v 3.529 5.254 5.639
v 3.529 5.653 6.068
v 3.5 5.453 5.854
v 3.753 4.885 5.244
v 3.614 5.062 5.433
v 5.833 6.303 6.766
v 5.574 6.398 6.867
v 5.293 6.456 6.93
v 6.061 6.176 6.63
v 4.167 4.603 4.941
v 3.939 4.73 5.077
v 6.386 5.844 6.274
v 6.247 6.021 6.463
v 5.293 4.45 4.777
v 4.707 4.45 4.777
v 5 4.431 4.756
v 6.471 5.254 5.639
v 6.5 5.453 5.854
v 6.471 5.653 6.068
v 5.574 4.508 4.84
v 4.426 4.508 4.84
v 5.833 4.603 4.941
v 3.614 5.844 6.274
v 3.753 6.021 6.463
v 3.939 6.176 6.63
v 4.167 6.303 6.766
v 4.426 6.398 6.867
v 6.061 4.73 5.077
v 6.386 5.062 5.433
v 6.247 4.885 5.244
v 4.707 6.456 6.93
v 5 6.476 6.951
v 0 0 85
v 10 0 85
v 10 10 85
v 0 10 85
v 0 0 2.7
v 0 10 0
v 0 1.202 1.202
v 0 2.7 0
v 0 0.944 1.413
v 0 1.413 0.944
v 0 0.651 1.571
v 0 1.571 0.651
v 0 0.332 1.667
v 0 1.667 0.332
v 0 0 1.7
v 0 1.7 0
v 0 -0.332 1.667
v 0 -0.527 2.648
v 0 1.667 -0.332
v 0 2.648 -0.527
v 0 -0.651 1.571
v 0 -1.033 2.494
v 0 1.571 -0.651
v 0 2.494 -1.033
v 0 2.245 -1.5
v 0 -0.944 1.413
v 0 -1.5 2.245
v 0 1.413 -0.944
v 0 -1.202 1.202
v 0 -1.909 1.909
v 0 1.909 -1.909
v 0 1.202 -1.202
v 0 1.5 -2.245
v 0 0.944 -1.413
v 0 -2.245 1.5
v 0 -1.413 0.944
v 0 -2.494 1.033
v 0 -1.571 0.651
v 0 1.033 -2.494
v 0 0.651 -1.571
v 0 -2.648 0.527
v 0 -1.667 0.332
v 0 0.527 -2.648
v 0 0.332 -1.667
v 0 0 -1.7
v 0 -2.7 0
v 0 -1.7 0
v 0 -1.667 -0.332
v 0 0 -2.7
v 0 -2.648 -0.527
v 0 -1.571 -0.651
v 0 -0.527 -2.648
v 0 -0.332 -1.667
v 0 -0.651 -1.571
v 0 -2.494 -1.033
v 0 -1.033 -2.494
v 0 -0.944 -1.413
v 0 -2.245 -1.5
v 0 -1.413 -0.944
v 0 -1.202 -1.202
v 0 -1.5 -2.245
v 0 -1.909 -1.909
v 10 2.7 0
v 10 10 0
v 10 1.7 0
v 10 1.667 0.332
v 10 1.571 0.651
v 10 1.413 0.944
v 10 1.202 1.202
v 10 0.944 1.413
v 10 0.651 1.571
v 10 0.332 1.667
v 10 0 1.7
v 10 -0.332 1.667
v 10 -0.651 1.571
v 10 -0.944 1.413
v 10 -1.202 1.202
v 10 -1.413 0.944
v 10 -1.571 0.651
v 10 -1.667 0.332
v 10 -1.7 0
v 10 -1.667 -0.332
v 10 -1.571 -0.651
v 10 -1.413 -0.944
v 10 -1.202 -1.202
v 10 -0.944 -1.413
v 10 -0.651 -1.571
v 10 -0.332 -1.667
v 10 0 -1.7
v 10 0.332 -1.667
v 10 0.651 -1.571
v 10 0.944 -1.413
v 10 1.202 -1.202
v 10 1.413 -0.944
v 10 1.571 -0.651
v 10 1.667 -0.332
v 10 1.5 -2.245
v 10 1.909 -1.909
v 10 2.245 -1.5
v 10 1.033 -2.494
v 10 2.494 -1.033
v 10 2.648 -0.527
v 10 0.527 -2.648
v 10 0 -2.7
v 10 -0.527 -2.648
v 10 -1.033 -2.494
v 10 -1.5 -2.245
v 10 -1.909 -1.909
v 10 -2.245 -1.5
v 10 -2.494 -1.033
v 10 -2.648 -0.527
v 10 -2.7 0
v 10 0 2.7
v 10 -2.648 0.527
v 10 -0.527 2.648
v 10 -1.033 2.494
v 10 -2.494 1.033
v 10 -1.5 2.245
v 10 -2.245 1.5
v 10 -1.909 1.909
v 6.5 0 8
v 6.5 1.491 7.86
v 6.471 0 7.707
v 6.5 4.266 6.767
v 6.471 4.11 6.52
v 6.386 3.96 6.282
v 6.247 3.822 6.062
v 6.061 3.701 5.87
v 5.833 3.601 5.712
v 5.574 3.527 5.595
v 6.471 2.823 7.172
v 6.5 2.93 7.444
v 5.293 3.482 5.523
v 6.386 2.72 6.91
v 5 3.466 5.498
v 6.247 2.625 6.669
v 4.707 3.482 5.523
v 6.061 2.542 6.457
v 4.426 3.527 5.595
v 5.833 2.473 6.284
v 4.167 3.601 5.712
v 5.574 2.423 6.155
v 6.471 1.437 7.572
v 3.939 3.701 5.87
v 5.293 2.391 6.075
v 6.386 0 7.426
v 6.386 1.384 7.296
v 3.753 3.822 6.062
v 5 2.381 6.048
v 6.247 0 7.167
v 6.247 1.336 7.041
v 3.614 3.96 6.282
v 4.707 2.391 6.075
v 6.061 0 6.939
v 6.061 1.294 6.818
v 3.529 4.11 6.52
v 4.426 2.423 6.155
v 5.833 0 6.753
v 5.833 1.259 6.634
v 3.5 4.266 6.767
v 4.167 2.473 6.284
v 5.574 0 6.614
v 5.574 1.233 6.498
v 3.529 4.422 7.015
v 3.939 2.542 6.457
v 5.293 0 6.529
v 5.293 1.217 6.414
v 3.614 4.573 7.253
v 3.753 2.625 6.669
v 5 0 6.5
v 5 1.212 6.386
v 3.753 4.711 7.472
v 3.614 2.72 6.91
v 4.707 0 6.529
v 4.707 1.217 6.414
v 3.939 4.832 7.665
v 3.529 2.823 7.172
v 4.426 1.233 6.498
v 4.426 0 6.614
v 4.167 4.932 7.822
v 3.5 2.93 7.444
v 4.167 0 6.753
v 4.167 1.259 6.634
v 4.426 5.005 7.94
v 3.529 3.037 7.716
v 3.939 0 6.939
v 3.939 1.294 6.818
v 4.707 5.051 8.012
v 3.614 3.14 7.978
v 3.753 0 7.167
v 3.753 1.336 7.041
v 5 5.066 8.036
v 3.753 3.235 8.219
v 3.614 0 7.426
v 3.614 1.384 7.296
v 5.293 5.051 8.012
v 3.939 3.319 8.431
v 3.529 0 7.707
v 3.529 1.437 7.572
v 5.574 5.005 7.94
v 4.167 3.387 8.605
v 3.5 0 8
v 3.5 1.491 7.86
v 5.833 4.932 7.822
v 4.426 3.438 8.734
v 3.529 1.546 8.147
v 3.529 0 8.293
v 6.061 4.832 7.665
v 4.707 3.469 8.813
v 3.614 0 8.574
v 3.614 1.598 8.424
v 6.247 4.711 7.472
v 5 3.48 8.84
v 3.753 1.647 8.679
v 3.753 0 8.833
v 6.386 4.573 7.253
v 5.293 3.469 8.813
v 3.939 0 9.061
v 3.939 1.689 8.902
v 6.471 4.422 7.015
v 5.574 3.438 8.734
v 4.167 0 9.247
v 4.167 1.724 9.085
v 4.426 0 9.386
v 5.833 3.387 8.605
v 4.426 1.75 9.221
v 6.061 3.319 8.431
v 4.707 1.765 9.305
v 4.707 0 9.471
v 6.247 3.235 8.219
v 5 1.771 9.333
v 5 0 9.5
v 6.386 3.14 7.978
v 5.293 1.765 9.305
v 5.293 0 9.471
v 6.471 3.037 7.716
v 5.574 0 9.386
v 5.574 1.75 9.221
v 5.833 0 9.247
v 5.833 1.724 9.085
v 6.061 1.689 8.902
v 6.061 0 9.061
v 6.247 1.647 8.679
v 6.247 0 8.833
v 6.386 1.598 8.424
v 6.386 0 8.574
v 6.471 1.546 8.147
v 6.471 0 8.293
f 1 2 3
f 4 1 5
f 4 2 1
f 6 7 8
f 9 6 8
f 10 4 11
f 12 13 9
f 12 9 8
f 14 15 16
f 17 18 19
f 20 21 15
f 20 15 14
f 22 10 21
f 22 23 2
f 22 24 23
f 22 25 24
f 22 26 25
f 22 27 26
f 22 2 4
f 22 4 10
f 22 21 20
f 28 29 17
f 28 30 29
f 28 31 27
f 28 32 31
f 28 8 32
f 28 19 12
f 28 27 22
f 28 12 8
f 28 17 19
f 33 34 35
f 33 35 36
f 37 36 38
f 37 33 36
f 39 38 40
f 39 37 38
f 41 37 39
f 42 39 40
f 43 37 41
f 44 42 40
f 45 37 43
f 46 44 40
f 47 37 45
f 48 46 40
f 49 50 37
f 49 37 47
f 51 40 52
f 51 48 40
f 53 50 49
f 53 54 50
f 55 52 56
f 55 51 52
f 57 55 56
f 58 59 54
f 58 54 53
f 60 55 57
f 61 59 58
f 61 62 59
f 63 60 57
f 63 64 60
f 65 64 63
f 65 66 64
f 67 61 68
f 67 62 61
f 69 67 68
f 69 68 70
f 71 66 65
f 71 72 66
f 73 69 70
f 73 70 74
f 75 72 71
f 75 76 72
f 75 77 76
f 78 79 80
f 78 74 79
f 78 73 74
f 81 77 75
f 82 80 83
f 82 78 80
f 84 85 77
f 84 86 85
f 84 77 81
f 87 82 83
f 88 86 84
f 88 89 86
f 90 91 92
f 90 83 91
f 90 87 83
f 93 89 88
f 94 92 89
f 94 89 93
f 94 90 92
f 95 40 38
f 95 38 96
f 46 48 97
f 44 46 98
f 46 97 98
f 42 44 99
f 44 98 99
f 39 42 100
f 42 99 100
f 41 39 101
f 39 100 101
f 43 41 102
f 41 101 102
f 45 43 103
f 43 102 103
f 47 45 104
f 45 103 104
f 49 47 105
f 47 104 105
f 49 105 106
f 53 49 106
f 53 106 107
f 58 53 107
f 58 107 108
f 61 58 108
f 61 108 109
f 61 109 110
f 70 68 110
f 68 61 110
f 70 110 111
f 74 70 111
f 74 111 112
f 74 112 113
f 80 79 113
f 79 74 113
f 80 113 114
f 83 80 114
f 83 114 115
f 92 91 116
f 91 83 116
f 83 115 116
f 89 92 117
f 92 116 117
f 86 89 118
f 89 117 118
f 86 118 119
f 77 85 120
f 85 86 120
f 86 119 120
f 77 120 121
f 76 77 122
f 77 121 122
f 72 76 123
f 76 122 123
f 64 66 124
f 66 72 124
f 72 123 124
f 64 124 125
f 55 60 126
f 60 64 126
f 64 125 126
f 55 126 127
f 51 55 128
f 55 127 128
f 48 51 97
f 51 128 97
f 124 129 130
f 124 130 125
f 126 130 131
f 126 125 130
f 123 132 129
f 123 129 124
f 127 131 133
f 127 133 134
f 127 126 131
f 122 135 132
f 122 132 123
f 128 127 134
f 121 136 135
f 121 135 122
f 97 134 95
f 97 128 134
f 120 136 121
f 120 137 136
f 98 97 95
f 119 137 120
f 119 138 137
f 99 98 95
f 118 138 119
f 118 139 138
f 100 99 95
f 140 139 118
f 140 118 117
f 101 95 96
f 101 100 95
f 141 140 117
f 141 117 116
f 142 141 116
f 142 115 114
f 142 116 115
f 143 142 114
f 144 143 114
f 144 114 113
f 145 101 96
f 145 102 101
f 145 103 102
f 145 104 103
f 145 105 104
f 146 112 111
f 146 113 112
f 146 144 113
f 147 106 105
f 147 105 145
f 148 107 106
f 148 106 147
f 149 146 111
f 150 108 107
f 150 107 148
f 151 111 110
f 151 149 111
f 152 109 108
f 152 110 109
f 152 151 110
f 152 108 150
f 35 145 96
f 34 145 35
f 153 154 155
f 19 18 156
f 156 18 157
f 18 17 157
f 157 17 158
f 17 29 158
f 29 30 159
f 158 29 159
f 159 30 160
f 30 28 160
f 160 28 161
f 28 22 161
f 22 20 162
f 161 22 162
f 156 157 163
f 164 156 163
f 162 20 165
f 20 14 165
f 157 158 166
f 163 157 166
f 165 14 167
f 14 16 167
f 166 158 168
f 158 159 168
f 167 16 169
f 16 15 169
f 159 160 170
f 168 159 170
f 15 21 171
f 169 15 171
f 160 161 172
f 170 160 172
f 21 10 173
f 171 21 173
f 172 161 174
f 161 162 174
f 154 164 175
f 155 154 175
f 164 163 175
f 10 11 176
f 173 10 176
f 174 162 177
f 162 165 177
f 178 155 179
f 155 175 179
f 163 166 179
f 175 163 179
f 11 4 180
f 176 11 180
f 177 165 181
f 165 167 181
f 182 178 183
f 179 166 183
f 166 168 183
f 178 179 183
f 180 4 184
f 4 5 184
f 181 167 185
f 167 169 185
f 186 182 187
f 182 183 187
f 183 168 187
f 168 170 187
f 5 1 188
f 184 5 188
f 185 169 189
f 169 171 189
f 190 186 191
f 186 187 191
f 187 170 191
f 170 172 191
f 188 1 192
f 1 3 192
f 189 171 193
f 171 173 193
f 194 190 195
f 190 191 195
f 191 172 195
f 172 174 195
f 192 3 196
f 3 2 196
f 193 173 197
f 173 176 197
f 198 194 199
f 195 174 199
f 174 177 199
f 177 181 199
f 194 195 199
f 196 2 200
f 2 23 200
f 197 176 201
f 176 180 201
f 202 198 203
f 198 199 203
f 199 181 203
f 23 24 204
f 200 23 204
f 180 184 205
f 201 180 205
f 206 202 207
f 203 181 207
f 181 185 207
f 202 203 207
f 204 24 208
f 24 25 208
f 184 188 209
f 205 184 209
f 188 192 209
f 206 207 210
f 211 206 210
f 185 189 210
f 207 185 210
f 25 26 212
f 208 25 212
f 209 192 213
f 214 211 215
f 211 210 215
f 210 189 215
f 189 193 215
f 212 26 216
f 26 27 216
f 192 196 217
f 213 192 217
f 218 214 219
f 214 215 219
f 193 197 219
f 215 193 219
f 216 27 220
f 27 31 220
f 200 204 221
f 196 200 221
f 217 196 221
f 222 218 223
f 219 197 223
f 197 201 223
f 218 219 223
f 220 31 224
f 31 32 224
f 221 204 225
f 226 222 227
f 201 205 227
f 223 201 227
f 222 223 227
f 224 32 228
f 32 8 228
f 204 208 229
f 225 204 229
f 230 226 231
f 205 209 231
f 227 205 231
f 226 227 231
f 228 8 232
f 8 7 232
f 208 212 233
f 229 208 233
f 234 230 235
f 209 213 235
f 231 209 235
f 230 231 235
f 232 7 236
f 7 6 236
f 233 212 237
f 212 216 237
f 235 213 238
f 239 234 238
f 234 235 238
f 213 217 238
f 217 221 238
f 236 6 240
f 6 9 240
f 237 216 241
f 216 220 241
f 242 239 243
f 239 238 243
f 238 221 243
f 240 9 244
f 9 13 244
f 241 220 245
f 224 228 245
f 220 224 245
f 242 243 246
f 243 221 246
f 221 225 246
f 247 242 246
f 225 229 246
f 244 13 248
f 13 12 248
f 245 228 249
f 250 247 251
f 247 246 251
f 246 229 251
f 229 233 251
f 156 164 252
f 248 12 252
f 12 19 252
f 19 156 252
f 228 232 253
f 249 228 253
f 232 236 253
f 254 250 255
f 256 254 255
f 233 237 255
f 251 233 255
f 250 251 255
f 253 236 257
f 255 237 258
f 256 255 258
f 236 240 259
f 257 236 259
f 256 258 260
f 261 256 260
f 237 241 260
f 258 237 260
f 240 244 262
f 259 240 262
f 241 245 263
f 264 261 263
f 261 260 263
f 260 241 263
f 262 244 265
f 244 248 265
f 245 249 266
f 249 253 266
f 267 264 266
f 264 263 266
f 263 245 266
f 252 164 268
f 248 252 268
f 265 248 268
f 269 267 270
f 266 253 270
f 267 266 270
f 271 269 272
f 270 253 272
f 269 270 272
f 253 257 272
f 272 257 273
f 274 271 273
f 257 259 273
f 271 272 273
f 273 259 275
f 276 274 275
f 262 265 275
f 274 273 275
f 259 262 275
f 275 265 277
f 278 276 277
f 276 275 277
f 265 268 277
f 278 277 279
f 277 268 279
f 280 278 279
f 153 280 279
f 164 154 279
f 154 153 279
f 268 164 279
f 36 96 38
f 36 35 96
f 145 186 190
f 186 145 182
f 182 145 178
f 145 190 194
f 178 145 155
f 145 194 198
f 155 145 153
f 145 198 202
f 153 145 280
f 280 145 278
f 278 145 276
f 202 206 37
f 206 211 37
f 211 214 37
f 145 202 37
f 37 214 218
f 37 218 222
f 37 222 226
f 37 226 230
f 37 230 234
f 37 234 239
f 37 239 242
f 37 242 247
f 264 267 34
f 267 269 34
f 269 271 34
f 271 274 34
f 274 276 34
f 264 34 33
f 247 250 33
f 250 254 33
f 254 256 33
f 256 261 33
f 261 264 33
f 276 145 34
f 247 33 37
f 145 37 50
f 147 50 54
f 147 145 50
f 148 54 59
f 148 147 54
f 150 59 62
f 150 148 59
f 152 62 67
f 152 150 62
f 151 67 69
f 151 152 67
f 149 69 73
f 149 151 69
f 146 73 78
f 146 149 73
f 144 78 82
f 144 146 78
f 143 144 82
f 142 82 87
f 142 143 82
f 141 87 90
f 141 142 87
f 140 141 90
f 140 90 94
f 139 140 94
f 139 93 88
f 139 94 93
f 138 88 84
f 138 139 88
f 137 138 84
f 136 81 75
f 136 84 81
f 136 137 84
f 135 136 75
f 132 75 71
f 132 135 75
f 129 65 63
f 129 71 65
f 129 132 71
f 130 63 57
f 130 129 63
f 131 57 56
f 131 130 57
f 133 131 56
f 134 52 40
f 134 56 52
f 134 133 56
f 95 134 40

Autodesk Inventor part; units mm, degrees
ref_plane "YZ Plane" through (0, 0, 0) normal (1, 0, 0) x (0, 1, 0)
ref_plane "XZ Plane" through (0, 0, 0) normal (0, 1, 0) x (-1, 0, 0)
sketch "Base" plane through (0, 0, 0) normal (0, 1, 0) x (-1, 0, 0)
  line L0 (0, 0) -> (-10, 0)
  line L1 (-10, 0) -> (-10, 85)
  line L2 (-10, 85) -> (0, 85)
  line L3 (0, 85) -> (0, 0)
  dimension "KeyWidth" = 10
  dimension "KeyLength" = 85
extrude "Main Body" add sketch "Base" along normal blind 10
sketch "Hinge Sketch" plane through (10, 0, 85) normal (1, 0, 0) x (0, 0, -1)
  circle A0 centre (85, 0) radius 1.7
  circle A1 centre (85, 0) radius 2.7
  dimension "d10" = 3.4
  dimension "d11" = 1
extrude "Hinge Surround" add sketch "Hinge Sketch" against normal up to surface (10 mm away)
extrude "Hinge Hole" cut sketch "Hinge Sketch" against normal up to next contours A0
ref_plane "Work Plane1" through (5, 0, 85) normal (1, 0, 0) x (0, 0, -1)
sketch "Sweep Path" plane through (5, 0, 85) normal (1, 0, 0) x (0, 0, -1)
  arc A0 (79.1465, 5.4531) -> (77, 0) centre (85, 0) ccw
  line L0 (0, 0) -> (82.3, 0) construction
  dimension "SweepAngle" = 42.972
  dimension "SweepRadius" = 8
sketch "Sweep Profile" plane through (0, 0, 0) normal (0, -1, 0) x (1, 0, 0)
  circle A0 centre (5, 8) radius 1.5
  point P0 (0, 0)
  dimension "RingThickness" = 3
sweep "Sweep2" cut profiles "Sweep Profile" path "Sweep Path"
equation "\"KeyWidth\" = MaxWidth"
equation "\"SweepArcLength\" = 6"
equation "\"MaxWidth\" = 10"
properties part number "Key0"
